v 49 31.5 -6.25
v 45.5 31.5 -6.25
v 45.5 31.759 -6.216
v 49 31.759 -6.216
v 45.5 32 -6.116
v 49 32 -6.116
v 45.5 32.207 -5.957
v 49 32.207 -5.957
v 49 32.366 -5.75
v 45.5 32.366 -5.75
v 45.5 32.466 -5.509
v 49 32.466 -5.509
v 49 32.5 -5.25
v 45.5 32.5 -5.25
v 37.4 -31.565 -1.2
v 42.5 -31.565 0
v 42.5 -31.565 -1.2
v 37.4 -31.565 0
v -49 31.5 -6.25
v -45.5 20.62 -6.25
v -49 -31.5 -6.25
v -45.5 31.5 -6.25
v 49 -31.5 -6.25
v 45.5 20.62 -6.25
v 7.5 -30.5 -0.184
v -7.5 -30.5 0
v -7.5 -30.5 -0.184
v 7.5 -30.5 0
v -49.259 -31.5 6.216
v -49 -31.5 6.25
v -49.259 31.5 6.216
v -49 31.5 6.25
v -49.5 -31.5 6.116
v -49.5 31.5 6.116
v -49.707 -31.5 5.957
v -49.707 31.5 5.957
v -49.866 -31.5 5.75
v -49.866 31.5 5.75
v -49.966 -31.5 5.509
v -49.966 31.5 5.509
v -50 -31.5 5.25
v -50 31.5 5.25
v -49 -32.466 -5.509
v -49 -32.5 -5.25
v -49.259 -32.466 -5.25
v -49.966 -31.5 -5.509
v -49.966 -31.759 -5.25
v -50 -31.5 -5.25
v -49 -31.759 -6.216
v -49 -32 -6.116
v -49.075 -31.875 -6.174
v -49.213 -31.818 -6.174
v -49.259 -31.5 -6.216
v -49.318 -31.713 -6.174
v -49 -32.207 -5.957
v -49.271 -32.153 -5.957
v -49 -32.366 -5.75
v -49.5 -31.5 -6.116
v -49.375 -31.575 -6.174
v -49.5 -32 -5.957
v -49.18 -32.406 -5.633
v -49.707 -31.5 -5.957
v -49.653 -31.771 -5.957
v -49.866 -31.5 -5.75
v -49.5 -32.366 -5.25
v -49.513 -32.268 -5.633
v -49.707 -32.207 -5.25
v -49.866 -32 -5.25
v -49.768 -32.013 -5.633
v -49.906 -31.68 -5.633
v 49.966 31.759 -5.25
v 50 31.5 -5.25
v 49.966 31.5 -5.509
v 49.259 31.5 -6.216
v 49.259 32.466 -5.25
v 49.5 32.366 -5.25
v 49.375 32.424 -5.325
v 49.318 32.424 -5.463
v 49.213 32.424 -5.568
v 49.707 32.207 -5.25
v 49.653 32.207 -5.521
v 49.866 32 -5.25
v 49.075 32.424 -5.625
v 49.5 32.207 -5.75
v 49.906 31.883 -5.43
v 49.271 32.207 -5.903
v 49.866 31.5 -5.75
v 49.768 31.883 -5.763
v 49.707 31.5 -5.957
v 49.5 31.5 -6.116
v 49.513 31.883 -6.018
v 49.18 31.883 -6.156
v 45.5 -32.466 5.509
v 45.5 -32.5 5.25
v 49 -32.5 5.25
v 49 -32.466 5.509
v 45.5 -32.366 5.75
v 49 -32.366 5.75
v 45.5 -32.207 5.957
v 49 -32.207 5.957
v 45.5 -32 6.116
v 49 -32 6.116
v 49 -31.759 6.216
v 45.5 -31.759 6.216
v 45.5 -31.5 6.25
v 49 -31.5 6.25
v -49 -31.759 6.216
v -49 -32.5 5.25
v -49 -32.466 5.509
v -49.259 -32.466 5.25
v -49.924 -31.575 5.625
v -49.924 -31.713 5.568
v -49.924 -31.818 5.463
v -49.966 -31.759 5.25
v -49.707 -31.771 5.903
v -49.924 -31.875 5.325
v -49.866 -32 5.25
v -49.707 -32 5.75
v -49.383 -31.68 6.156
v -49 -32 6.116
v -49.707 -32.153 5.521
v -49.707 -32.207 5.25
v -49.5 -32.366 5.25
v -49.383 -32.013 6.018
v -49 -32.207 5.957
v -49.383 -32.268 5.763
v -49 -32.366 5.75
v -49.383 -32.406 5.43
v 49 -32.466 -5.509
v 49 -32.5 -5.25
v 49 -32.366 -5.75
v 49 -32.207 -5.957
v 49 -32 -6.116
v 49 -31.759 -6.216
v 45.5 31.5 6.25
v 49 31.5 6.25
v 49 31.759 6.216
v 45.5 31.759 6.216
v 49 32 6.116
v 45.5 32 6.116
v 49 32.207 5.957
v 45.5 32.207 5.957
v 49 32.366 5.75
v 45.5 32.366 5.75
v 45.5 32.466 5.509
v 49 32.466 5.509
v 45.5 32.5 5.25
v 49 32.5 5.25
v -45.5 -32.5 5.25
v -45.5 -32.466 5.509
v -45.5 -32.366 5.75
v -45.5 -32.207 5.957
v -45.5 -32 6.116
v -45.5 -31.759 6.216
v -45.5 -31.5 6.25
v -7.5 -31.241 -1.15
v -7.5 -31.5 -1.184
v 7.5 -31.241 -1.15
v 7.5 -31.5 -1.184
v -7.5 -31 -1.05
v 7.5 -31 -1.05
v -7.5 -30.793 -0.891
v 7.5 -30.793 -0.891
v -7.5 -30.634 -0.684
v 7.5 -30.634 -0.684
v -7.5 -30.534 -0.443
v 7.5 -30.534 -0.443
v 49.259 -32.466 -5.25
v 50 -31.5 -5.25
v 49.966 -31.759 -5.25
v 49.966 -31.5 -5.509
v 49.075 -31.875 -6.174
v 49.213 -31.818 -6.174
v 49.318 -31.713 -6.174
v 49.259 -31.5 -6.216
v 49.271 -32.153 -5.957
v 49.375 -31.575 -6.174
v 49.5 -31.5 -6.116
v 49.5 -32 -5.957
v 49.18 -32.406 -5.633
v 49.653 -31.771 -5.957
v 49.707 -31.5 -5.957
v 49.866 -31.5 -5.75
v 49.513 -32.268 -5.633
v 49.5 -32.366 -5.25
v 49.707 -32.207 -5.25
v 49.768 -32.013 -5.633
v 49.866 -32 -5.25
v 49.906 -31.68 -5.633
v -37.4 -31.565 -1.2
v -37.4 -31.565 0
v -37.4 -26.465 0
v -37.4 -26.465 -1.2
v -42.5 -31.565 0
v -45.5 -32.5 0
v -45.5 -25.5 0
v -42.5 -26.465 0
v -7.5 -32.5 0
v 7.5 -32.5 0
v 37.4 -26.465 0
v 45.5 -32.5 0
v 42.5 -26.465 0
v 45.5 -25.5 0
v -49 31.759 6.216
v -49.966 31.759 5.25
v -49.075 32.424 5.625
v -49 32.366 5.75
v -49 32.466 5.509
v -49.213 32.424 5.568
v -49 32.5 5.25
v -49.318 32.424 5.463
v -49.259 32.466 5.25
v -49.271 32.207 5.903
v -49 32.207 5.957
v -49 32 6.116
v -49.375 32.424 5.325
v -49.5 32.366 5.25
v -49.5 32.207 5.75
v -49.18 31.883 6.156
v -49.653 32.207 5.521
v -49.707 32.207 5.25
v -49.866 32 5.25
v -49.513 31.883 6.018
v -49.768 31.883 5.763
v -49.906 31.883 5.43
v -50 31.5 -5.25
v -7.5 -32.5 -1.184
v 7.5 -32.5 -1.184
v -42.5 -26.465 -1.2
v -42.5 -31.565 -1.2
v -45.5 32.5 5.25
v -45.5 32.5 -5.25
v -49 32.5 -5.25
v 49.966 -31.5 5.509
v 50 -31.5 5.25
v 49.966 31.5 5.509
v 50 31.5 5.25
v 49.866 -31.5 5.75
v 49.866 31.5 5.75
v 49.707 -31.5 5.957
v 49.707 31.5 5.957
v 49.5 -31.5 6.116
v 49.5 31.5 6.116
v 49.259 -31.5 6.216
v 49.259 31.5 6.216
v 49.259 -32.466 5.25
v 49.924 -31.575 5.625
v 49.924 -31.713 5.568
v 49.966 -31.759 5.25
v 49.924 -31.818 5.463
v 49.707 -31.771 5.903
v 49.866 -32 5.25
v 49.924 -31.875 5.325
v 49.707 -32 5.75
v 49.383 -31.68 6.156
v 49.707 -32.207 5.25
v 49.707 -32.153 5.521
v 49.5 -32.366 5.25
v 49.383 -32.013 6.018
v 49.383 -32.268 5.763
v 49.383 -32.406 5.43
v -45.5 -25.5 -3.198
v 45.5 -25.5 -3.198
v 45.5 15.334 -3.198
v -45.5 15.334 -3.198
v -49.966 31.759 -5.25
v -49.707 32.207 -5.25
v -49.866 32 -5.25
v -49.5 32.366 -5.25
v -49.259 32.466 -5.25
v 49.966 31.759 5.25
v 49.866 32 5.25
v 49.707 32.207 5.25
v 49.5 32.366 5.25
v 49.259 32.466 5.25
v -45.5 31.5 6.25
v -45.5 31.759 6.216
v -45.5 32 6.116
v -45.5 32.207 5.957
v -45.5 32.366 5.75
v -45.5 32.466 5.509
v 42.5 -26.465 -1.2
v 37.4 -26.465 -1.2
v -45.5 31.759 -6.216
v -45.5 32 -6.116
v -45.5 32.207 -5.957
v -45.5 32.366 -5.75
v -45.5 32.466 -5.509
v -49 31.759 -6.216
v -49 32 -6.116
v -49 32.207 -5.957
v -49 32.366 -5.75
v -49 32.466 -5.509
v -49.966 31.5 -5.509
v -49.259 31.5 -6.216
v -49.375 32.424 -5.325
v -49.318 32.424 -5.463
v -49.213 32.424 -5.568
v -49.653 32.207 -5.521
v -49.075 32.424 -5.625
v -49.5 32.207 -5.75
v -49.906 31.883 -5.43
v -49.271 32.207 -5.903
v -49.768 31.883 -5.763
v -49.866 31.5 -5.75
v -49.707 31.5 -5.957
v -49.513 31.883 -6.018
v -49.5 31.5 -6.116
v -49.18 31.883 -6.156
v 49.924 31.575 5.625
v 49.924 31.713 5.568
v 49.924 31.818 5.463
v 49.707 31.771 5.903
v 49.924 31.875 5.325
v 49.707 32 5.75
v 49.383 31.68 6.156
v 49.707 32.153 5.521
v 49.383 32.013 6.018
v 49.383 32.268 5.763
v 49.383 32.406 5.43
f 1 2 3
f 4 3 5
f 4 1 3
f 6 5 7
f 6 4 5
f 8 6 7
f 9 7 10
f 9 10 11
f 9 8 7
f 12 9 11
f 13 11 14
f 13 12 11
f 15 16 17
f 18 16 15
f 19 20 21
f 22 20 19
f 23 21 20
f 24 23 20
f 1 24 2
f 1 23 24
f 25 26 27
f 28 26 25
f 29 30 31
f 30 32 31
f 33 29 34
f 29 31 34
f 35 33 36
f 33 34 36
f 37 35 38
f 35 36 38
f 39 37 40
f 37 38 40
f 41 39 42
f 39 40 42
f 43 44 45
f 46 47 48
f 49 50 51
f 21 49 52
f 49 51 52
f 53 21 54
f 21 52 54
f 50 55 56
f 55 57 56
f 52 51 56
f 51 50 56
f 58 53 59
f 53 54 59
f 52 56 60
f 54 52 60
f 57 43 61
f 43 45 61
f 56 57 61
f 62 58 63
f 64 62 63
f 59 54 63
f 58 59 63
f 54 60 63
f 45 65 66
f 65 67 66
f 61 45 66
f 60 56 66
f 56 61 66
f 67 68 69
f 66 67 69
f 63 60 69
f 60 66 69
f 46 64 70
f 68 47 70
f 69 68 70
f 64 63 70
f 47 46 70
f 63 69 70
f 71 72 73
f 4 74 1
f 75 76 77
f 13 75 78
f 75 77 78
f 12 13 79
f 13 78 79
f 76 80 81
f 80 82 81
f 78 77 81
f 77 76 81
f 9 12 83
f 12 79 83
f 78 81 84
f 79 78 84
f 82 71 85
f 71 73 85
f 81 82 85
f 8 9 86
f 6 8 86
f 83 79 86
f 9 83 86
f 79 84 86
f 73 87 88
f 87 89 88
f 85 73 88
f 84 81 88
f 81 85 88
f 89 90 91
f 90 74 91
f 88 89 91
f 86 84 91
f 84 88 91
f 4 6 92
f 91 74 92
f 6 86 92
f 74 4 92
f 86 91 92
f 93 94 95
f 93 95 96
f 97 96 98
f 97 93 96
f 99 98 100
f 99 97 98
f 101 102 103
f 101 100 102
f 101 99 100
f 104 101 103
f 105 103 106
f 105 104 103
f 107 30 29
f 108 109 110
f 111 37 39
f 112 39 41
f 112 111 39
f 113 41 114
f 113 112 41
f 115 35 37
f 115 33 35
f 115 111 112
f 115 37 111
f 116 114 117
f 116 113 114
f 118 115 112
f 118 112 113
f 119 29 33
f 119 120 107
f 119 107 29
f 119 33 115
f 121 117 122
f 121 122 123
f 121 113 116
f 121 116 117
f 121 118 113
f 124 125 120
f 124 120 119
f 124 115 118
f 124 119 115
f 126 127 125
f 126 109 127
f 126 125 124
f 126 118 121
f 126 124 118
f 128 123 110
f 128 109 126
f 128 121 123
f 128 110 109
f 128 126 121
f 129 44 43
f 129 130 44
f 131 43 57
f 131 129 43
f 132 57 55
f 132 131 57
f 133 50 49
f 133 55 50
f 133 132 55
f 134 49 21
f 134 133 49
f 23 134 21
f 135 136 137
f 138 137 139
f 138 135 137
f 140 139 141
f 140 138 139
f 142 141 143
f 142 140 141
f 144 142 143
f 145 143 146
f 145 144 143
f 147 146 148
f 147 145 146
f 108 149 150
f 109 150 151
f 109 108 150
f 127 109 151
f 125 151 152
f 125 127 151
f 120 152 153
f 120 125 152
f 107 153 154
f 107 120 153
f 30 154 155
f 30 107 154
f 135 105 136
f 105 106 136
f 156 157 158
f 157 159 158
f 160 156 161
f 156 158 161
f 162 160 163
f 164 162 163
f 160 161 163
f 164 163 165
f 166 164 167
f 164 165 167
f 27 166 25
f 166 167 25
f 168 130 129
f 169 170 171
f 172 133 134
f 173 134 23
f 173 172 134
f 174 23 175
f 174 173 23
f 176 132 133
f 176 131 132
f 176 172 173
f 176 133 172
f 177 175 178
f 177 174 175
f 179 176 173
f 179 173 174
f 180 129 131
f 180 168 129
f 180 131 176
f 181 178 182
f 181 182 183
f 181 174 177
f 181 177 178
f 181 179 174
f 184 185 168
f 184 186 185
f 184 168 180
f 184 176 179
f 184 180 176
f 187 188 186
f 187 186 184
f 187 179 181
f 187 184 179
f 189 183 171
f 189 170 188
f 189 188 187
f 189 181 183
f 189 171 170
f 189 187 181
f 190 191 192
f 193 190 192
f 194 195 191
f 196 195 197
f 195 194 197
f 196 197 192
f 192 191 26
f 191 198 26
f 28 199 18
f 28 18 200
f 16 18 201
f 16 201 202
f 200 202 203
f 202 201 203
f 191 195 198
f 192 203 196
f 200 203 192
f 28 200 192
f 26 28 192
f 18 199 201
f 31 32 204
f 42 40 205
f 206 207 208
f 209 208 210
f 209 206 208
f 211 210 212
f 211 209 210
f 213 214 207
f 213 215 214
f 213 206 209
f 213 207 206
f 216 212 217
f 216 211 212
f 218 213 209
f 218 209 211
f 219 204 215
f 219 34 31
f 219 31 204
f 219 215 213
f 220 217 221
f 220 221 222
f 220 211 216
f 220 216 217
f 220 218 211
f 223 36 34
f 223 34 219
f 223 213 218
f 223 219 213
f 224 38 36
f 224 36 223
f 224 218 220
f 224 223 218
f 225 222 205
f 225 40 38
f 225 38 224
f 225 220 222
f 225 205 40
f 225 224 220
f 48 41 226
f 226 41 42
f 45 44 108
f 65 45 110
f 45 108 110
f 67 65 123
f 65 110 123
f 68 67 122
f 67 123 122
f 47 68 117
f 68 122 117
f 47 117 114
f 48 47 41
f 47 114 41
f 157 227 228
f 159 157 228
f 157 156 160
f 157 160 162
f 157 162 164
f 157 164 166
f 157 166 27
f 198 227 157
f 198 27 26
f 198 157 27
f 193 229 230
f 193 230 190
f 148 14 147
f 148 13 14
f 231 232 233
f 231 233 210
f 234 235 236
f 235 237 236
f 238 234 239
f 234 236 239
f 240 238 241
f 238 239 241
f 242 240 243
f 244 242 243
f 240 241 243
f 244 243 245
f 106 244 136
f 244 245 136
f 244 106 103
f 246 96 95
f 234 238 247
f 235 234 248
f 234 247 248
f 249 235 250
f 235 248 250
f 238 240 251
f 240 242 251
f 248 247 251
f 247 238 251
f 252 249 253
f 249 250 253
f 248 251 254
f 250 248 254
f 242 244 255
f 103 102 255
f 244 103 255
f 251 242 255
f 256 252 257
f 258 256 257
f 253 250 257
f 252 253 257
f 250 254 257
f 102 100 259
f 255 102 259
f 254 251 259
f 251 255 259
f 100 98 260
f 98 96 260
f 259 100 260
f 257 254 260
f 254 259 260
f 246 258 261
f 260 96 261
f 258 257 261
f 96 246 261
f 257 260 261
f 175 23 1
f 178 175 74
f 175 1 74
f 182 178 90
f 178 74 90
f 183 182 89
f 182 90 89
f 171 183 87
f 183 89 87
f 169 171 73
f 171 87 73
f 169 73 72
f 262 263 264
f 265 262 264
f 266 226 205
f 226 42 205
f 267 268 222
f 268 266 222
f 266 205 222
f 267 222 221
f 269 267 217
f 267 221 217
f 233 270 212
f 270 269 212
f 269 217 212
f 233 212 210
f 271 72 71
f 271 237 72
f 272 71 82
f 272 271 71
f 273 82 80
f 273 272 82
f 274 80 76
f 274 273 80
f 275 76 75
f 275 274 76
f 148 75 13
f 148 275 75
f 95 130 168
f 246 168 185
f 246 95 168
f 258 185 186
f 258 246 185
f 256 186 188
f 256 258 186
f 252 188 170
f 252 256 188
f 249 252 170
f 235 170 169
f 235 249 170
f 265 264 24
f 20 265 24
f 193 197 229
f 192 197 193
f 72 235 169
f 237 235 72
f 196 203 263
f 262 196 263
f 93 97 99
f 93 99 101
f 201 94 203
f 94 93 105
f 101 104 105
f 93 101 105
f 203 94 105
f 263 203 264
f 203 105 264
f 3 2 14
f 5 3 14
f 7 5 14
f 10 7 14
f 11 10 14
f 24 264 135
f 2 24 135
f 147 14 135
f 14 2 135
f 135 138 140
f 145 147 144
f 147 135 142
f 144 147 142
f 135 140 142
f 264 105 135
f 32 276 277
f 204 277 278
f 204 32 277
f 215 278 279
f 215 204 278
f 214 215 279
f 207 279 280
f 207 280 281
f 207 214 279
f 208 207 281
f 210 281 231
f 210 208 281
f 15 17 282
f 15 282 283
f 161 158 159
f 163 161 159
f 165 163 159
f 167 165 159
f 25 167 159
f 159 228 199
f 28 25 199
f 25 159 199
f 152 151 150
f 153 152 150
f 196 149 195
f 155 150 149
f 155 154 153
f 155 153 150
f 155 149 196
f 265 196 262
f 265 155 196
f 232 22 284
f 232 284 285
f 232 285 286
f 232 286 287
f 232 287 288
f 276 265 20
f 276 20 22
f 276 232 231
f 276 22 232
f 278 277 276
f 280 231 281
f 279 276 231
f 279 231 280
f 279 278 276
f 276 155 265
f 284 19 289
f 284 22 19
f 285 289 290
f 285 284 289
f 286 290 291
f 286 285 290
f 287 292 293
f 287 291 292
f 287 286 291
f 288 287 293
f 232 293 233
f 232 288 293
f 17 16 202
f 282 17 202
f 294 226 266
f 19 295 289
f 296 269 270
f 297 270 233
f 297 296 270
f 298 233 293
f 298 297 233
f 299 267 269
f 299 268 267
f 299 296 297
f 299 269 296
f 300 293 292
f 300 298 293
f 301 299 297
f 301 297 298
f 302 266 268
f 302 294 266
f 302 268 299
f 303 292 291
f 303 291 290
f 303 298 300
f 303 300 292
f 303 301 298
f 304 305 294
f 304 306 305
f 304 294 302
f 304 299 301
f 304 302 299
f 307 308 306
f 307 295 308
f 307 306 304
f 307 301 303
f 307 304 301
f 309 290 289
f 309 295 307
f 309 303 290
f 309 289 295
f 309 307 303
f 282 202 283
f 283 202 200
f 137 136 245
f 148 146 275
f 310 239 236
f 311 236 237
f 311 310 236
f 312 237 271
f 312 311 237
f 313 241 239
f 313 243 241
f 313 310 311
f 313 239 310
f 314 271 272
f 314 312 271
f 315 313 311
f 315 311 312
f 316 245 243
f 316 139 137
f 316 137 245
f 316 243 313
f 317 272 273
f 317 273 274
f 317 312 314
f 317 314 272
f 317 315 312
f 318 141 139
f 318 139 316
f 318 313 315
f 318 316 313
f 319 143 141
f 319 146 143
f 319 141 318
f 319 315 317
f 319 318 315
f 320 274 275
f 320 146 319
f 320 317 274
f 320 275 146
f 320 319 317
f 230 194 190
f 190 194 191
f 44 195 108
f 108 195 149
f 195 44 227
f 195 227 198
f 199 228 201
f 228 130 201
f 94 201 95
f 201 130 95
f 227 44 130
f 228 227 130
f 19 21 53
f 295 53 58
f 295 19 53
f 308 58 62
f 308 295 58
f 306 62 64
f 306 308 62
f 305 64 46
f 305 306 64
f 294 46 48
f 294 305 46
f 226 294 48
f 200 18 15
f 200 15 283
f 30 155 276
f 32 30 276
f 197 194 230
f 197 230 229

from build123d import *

# Parameters (mm, degrees)
F0_W     = 65
F0_H     = 12.5
F1_DEPTH = 50
F3_DEPTH = 45.5
F4_W     = 5.1
F4_H     = 5.1
F5_DEPTH = 1.2
F6_R     = 1
F7_W     = 15
F7_H     = 1.1837528777
F8_DEPTH = 2
F9_R     = 1


# Not quite as in the source:
# - a pattern or mirror of a feature is missing from the dataset's text; its kind, count and spacing are read off the source's solid


with BuildPart() as f1:
    # F0 (on Right) → F1 (new body, symmetric)
    with BuildSketch(Plane.YZ):
        Rectangle(F0_W, F0_H)
    extrude(amount=F1_DEPTH, both=True)

    # F2 (on Right) → F3 (cut, symmetric)
    with BuildSketch(Plane.YZ):
        Polygon((-32.5, 6.25), (-32.5, 0), (-25.5, 0), (-25.5, -3.1976206858), (15.3335404618, -3.1976206858), (20.620416518, -6.25), (32.5, -6.25), (32.5, 6.25), align=None)
    extrude(amount=F3_DEPTH, both=True, mode=Mode.SUBTRACT)

    # F4 (on face) → F5 (cut)
    with BuildSketch(Plane.XY):
        with Locations((-39.95, -29.0152)):
            Rectangle(F4_W, F4_H)
    f5 = extrude(amount=-F5_DEPTH, mode=Mode.SUBTRACT)

    # F5_copies: F5 across plane
    add(f5.mirror(Plane(origin=(0, 0, 0), x_dir=(0, 0, 1), z_dir=(1, 0, 0))), mode=Mode.SUBTRACT)

    # F6
    f6_edges = [f1.edges().sort_by_distance(p)[0] for p in [
        (-47.75, -32.5, 6.25),
        (47.75, -32.5, 6.25),
        (-50, 0, 6.25),
        (-47.75, 32.5, 6.25),
        (47.75, 32.5, 6.25),
        (50, 0, 6.25),
        (-50, -32.5, 0),
        (50, -32.5, 0),
        (0, -32.5, -6.25),
        (50, 0, -6.25),
        (50, 32.5, 0),
        (-50, 0, -6.25),
        (-50, 32.5, 0),
        (-47.75, 32.5, -6.25),
        (47.75, 32.5, -6.25),
    ]]
    fillet(f6_edges, radius=F6_R)

    # F7 (on face) → F8 (cut)
    with BuildSketch(Plane.XZ.offset(32.5)):
        with Locations((0, -0.5918764388)):
            Rectangle(F7_W, F7_H)
    extrude(amount=-F8_DEPTH, mode=Mode.SUBTRACT)

    # F9
    f9_edges = [f1.edges().sort_by_distance(p)[0] for p in [
        (0, -30.5, -1.183753),
    ]]
    fillet(f9_edges, radius=F9_R)


solid = f1.part
